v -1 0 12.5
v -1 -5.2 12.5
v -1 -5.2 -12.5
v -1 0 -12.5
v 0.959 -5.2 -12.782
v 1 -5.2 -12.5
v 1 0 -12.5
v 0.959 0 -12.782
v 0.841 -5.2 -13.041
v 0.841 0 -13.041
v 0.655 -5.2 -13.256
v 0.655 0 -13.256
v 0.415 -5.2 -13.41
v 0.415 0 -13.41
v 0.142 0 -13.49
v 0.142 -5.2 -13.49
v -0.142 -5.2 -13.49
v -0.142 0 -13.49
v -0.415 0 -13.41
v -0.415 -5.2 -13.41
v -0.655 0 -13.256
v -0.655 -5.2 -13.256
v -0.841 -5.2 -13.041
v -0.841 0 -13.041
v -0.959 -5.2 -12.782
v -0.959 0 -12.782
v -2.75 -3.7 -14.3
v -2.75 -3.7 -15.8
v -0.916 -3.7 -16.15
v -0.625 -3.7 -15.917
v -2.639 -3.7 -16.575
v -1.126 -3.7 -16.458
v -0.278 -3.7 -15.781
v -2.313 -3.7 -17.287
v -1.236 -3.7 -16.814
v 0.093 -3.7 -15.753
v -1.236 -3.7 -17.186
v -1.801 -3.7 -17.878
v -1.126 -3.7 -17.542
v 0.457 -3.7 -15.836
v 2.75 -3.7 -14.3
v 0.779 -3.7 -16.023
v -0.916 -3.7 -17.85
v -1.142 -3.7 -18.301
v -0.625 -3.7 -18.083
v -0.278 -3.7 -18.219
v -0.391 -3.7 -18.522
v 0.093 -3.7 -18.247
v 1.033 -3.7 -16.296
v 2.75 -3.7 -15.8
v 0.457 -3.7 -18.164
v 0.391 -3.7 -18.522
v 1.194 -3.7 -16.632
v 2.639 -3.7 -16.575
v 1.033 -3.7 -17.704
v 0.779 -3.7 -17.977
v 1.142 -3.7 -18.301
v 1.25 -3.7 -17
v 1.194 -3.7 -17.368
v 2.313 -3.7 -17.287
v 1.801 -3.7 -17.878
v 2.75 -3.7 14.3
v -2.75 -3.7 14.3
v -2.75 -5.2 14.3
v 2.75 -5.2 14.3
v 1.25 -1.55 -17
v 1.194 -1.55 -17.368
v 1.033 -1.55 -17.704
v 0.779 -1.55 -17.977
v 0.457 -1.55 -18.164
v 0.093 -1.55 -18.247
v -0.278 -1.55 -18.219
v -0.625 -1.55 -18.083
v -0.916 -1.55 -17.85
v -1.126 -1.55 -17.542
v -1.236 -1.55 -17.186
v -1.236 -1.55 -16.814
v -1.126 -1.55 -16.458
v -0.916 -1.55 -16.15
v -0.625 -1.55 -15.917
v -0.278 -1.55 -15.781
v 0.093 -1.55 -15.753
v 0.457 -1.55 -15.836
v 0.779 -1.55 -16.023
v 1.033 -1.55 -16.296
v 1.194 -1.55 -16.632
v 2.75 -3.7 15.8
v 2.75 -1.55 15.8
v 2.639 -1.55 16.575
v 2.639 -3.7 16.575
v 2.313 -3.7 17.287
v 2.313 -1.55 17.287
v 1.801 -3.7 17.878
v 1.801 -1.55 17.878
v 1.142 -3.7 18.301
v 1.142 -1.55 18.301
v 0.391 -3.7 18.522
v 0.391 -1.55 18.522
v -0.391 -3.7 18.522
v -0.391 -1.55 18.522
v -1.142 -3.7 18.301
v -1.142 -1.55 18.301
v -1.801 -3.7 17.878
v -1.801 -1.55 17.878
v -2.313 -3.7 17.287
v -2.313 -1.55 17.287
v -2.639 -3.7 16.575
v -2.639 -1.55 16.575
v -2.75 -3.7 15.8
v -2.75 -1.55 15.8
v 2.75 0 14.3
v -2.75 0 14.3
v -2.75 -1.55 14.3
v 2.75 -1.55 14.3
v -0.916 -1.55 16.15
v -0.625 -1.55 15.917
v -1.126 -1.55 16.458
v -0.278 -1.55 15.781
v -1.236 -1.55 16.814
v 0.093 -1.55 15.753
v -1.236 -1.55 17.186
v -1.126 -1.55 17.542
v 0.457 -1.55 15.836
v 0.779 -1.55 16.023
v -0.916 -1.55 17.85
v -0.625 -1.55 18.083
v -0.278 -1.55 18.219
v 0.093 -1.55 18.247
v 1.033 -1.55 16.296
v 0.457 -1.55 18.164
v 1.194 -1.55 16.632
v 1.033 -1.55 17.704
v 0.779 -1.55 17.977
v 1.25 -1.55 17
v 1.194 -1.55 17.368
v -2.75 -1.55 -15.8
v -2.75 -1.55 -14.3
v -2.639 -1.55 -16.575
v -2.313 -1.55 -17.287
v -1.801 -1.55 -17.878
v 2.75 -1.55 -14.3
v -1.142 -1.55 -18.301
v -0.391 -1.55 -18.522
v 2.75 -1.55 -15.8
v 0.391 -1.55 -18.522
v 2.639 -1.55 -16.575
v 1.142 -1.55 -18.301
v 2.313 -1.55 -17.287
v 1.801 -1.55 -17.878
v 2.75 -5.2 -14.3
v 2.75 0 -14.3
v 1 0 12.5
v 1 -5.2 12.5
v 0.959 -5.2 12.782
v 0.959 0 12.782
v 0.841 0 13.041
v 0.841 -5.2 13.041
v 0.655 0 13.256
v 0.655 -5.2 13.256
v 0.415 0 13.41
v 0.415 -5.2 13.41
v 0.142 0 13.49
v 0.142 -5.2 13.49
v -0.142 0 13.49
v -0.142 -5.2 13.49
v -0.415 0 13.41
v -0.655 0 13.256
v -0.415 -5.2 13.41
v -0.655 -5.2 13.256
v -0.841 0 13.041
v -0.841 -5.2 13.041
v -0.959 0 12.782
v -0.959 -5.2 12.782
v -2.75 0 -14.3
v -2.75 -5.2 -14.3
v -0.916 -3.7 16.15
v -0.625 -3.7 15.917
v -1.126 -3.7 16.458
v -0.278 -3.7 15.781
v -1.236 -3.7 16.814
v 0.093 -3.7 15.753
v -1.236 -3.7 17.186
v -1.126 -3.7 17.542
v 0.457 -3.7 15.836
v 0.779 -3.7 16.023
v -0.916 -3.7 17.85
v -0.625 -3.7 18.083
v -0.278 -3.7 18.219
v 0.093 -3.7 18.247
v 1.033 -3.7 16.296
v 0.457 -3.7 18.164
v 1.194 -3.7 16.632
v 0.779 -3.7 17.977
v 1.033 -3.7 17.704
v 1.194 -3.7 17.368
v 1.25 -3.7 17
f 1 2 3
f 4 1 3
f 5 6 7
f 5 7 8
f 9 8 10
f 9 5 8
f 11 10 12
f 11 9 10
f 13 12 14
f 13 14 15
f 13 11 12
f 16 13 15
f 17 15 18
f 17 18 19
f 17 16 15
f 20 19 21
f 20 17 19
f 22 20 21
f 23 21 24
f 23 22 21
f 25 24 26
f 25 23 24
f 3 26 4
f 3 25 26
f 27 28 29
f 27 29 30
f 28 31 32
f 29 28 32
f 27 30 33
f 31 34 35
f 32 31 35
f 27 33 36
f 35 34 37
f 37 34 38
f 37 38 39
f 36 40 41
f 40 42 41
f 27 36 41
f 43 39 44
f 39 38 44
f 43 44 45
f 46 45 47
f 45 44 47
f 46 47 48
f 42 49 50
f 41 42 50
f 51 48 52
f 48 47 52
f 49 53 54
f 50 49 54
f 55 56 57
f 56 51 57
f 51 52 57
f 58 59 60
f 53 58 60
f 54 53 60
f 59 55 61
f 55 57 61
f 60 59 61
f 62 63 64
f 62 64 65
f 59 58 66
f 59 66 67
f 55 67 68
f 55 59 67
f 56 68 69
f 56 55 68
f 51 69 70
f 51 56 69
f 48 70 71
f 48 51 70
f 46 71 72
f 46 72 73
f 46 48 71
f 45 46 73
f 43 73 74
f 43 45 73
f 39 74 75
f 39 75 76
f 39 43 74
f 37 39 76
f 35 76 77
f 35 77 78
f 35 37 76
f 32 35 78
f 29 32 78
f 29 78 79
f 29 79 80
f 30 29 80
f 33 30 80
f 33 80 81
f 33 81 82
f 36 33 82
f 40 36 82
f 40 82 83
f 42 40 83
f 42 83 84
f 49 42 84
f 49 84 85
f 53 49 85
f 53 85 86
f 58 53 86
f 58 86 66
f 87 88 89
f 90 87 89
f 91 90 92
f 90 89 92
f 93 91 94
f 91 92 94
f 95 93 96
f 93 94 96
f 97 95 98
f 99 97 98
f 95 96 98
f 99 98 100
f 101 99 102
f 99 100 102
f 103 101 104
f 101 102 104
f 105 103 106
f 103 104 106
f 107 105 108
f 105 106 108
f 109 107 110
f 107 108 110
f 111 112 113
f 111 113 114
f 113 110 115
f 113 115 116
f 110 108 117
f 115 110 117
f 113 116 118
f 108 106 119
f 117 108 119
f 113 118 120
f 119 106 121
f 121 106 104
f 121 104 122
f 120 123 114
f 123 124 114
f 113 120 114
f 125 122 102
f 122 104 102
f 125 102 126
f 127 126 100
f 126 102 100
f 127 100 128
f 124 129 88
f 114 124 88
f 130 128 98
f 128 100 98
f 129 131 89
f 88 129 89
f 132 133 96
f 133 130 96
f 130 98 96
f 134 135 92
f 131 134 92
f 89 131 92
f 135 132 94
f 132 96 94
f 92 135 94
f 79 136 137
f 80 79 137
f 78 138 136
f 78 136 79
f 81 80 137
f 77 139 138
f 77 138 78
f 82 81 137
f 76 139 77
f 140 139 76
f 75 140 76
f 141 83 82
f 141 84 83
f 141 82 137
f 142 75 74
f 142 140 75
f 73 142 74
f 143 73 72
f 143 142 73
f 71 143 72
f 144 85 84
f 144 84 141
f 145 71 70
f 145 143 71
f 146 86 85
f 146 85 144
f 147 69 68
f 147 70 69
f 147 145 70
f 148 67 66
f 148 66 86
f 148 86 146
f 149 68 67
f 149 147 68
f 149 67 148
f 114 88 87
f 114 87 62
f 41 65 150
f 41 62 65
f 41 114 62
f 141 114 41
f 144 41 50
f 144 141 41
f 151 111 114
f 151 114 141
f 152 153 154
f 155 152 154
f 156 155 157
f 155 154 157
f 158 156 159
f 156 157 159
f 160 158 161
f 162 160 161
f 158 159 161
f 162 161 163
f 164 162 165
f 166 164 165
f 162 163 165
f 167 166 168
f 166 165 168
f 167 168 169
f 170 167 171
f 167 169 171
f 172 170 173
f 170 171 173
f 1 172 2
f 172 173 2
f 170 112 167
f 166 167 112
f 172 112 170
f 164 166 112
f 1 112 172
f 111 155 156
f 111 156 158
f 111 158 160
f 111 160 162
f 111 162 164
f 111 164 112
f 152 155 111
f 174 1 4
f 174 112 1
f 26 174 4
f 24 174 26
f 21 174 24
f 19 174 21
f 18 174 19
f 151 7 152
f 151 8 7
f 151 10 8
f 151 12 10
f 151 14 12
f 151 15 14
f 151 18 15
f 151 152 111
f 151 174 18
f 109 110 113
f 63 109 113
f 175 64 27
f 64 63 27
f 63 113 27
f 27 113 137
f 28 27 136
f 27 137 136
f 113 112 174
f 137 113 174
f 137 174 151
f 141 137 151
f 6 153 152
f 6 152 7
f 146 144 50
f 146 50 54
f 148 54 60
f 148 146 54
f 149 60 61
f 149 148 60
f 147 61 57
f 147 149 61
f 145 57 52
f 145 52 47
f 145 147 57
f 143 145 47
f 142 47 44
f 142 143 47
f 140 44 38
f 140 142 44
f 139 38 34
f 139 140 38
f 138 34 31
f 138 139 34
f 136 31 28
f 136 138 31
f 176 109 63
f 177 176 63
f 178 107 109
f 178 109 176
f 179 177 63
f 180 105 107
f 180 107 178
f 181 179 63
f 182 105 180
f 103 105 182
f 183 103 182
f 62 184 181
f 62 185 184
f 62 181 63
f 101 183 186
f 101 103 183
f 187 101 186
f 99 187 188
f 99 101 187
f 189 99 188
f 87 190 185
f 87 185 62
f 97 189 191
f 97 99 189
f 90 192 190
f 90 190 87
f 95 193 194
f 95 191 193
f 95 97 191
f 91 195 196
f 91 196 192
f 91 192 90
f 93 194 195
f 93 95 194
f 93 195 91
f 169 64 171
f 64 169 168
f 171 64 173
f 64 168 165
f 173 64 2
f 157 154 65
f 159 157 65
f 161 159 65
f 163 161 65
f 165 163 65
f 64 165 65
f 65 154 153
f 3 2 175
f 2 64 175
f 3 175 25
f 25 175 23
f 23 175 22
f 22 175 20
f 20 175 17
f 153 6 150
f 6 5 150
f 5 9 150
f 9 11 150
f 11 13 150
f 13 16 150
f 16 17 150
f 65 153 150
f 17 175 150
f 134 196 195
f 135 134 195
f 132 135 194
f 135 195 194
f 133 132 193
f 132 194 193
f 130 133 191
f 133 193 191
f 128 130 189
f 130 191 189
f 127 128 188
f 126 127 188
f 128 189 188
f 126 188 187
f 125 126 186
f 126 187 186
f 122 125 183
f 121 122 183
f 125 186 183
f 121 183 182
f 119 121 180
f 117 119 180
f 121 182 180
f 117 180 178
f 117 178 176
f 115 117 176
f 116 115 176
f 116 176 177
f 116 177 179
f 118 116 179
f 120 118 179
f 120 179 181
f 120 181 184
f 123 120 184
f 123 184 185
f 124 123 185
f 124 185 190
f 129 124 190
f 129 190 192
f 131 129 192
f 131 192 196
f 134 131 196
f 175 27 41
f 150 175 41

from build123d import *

# Parameters (mm, degrees)
F0_W     = 5.5
F0_H     = 14.3
F1_DEPTH = 5.2
F2_W     = 2
F2_H     = 12.5
F3_DEPTH = 5.5
F5_W     = 5.5
F5_H     = 1.5
F6_DEPTH = 2.15
F7_R     = 1.25
F8_DEPTH = 3


with BuildPart() as f1:
    # F0 (on Front) → F1 (new body)
    with BuildSketch(Plane.XZ):
        with Locations((0, 7.15)):
            Rectangle(F0_W, F0_H)
    extrude(amount=F1_DEPTH)

    # F2 (on face) → F3 (cut)
    with BuildSketch(Plane.XZ.offset(5.2)):
        with Locations((0, 6.25)):
            Rectangle(F2_W, F2_H)
        with BuildLine():
            ThreePointArc((1, 12.5), (0, 13.5), (-1, 12.5))
            Line((-1, 12.5), (1, 12.5))
        make_face()
    extrude(amount=-F3_DEPTH, mode=Mode.SUBTRACT)

    # F5 (on offset) → F6 (join)
    with BuildSketch(Plane.XZ.offset(1.55)):
        with Locations((0, 15.05)):
            Rectangle(F5_W, F5_H)
        with BuildLine():
            ThreePointArc((2.75, 15.8), (0, 18.55), (-2.75, 15.8))
            Line((-2.75, 15.8), (2.75, 15.8))
        make_face()
    extrude(amount=F6_DEPTH)

    # F7 (on face) → F8 (cut)
    with BuildSketch(Plane.XZ.offset(3.7)):
        with Locations((0, 17)):
            Circle(F7_R)
    extrude(amount=-F8_DEPTH, mode=Mode.SUBTRACT)

    # F9: F1 across plane


with BuildPart() as f1_1:
    add(f1.part)
    add(f1.part.mirror(Plane.XY))


solid = f1_1.part
